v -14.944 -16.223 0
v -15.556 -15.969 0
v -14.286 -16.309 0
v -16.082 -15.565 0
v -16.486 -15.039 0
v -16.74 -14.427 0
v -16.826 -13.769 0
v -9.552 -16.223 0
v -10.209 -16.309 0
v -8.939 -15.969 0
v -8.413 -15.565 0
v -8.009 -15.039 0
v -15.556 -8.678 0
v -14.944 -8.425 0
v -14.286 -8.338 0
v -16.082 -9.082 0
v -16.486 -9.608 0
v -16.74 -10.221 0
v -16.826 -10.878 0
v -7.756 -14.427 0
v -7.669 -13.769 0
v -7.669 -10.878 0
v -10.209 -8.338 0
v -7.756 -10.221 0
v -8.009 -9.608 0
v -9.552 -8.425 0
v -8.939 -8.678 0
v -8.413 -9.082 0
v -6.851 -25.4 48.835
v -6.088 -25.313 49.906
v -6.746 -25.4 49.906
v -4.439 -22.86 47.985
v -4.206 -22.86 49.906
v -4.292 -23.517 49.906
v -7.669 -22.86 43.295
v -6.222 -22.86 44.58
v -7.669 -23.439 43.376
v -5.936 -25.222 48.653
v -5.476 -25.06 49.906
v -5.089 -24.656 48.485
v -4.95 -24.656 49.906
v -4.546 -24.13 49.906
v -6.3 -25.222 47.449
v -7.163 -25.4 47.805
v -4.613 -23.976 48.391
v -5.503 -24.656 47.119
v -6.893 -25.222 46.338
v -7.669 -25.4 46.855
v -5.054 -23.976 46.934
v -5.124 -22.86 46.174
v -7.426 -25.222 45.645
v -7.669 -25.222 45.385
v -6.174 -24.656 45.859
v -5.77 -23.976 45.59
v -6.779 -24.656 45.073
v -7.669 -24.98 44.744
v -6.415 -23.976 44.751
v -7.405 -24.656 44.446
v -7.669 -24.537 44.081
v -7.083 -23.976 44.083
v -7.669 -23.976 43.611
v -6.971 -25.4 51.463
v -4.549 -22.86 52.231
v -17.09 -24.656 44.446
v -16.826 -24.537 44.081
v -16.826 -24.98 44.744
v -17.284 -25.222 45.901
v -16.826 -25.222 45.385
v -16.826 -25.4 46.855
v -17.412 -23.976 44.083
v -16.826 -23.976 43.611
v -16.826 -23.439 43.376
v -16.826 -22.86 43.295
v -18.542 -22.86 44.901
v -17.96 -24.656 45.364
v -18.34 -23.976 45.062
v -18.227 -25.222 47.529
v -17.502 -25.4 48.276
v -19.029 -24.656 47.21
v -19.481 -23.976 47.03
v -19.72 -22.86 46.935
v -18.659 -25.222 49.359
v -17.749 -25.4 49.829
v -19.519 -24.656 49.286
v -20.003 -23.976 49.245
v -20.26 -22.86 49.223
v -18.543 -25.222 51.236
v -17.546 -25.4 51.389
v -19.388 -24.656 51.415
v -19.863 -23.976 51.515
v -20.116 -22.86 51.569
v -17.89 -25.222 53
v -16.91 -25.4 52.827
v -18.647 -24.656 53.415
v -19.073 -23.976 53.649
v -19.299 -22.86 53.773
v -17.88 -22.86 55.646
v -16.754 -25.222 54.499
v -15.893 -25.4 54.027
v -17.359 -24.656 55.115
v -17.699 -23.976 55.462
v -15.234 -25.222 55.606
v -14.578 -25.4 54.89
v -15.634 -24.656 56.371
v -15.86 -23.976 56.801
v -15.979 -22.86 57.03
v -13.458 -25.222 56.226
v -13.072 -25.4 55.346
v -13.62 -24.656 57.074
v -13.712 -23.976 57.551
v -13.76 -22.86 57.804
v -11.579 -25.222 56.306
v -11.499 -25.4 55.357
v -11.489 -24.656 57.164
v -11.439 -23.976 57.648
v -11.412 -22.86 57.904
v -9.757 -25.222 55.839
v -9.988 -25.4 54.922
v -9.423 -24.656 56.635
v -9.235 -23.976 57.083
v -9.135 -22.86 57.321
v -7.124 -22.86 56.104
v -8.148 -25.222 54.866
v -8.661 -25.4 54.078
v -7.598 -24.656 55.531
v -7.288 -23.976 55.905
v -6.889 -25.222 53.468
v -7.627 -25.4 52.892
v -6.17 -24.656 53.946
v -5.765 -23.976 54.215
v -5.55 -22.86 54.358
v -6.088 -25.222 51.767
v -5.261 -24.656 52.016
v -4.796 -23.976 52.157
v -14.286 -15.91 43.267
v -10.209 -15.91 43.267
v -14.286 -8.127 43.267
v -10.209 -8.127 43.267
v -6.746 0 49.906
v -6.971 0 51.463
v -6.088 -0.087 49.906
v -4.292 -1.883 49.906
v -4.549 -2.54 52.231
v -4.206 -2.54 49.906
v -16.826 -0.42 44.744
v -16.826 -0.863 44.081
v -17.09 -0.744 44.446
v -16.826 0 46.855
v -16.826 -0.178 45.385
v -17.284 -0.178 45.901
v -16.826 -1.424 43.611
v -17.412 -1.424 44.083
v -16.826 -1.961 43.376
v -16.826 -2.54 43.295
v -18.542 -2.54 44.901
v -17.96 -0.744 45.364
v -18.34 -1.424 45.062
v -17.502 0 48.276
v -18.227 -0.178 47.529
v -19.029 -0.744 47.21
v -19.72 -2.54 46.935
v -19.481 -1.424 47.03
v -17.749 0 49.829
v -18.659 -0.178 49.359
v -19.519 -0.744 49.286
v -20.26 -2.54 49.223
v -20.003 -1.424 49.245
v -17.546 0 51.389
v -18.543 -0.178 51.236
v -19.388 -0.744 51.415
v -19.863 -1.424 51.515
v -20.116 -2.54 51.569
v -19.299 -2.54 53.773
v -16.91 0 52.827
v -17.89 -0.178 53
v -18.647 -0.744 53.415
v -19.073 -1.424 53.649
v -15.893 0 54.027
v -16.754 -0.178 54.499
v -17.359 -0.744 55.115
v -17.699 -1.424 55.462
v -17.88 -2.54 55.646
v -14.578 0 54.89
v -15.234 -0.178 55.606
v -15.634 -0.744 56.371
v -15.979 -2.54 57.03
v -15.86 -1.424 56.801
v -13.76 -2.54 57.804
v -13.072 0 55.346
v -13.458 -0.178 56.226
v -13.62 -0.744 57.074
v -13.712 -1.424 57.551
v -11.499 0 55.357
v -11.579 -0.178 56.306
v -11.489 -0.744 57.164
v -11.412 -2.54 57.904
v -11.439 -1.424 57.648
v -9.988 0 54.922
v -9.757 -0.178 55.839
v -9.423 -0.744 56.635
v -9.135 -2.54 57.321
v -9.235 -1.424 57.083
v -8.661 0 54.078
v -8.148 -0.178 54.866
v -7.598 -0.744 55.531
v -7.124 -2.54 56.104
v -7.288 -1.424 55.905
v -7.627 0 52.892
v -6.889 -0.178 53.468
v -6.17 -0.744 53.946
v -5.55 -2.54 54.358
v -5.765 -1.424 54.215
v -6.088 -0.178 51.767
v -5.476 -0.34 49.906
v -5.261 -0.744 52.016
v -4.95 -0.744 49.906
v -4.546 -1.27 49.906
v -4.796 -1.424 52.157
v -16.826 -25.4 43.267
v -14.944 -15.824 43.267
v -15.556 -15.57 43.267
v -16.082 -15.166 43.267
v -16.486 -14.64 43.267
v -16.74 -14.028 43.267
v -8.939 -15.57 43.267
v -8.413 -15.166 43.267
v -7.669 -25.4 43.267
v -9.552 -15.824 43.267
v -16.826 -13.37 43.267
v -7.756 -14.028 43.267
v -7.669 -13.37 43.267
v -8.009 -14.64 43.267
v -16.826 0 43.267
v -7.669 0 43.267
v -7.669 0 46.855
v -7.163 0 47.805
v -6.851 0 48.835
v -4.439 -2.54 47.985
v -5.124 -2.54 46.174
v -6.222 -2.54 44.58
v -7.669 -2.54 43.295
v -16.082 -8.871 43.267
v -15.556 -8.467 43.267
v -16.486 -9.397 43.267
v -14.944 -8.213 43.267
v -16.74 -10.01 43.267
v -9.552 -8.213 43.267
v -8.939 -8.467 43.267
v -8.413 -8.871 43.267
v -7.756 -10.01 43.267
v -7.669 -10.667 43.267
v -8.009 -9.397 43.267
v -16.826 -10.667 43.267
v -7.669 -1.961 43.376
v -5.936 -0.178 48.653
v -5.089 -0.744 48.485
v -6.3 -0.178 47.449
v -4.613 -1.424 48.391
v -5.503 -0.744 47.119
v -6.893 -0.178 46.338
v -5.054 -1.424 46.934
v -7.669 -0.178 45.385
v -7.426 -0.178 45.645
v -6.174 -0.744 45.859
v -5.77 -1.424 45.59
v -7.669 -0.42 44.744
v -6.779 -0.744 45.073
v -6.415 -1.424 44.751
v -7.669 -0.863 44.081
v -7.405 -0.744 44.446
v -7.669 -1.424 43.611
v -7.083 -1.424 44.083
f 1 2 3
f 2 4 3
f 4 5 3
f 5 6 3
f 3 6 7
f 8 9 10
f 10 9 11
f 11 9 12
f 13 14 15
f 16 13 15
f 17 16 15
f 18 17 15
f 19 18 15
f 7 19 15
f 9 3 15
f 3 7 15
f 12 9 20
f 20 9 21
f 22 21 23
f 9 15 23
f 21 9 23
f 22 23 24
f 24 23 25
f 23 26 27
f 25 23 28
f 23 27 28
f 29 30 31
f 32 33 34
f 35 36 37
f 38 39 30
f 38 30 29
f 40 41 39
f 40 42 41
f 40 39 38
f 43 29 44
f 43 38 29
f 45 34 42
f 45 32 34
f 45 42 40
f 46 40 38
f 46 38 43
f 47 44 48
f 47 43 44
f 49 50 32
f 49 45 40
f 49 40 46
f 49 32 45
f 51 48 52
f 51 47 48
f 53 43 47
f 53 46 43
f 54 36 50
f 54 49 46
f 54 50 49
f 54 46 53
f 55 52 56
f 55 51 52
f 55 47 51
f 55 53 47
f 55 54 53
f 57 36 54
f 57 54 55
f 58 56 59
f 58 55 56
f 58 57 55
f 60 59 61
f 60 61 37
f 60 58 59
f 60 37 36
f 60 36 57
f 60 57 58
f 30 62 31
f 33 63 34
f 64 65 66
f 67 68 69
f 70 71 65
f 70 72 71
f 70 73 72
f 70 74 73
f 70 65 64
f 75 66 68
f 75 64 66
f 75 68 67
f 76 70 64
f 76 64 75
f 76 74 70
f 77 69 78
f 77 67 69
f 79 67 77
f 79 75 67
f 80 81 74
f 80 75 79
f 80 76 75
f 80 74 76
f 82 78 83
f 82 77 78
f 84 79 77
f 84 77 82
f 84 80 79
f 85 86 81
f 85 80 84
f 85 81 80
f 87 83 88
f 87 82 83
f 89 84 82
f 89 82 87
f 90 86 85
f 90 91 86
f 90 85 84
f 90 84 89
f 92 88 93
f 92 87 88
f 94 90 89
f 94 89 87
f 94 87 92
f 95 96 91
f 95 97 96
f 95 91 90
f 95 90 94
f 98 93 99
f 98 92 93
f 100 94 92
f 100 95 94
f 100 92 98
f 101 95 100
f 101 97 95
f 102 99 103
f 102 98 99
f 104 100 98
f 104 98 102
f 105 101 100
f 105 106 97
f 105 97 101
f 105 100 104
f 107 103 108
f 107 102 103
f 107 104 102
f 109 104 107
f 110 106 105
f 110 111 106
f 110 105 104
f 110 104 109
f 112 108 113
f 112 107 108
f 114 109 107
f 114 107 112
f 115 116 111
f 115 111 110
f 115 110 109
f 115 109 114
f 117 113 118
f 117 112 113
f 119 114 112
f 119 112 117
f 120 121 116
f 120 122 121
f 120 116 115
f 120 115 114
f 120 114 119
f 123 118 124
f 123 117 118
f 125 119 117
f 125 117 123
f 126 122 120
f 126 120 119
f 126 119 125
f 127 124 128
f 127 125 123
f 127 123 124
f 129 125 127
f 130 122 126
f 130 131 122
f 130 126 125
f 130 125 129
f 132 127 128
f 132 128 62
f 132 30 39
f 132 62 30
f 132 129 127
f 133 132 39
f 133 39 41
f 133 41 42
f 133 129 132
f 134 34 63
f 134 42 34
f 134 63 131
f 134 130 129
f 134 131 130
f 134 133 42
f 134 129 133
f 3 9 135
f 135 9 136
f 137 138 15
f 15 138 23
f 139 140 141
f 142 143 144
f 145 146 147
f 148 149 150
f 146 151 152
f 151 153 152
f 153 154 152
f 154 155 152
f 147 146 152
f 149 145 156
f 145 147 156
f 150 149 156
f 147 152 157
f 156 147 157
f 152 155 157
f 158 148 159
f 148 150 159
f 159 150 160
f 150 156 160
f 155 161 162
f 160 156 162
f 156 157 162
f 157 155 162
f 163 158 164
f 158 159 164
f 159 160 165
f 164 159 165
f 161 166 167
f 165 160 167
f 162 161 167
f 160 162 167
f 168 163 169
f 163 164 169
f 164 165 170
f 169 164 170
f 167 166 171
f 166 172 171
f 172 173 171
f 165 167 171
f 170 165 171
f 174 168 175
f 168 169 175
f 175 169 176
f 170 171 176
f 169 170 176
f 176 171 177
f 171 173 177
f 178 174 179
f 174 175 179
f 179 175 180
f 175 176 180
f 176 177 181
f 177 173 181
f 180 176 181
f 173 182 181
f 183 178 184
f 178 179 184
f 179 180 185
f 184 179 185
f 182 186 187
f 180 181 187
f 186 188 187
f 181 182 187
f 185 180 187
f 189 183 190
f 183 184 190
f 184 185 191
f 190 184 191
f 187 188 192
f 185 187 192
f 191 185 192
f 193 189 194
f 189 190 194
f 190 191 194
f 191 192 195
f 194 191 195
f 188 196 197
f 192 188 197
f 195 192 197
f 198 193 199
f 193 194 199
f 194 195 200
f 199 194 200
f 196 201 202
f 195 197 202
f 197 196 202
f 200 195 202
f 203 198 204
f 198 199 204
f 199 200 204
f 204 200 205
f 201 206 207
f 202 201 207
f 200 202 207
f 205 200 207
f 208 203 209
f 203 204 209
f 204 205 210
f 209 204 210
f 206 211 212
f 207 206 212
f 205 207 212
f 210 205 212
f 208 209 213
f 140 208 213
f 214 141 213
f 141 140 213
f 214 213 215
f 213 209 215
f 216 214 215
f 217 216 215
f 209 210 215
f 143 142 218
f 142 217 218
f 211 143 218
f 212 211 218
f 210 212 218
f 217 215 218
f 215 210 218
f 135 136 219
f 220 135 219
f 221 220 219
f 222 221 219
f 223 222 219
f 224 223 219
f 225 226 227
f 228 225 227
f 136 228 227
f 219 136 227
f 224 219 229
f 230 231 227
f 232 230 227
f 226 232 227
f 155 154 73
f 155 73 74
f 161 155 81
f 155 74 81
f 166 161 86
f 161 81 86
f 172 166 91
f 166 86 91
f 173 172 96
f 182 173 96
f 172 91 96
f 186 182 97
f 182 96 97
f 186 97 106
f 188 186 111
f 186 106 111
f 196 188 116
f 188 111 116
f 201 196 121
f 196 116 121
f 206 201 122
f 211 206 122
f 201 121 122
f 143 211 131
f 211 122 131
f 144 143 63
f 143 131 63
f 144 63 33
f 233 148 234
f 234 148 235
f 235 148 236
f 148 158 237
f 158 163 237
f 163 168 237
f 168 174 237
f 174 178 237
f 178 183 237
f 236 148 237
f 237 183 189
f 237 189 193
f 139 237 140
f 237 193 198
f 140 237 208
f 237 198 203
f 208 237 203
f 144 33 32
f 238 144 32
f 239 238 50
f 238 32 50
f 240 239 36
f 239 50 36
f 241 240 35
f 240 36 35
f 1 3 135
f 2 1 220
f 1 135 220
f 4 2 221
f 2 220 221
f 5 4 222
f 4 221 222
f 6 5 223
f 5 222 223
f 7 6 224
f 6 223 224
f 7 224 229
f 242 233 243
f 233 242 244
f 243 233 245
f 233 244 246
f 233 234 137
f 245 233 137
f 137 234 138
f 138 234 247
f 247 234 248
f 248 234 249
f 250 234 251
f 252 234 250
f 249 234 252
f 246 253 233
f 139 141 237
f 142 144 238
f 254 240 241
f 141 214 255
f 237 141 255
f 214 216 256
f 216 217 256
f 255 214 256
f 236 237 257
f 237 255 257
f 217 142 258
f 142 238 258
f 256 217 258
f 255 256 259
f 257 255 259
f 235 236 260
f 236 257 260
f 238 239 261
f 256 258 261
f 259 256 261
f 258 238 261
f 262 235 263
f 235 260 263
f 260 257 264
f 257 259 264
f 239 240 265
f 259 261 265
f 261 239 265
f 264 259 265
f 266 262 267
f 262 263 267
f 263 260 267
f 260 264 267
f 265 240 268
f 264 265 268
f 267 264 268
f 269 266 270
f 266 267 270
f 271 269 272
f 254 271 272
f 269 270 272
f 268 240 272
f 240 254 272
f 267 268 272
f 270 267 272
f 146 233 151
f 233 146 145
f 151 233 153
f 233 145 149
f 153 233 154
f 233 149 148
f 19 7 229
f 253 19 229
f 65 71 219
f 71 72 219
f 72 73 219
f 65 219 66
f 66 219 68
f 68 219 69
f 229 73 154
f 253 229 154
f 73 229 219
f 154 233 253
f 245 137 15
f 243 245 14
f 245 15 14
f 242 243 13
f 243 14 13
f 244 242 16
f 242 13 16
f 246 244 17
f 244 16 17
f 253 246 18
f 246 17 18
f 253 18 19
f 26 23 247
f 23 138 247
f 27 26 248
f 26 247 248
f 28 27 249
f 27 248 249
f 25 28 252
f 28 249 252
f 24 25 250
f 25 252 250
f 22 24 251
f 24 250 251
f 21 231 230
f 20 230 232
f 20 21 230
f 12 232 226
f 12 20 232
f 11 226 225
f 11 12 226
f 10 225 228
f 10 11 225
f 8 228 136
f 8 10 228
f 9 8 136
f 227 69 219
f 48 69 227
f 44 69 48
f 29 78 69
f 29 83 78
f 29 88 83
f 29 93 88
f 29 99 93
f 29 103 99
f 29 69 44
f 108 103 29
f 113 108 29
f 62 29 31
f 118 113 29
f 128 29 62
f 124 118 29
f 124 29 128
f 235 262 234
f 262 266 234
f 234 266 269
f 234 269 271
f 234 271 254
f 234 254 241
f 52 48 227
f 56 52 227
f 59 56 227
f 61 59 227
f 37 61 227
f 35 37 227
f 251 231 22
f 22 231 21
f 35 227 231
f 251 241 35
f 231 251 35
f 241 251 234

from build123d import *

# Parameters (mm, degrees)
F0_W     = 25.4
F0_H     = 63.5
F1_DEPTH = 25.4
F3_DEPTH = 25.4
F5_DEPTH = 25.4
F7_DEPTH = 25.4
F8_R     = 2.54


with BuildPart() as f1:
    # F0 (on Front) → F1 (new body)
    with BuildSketch(Plane.XZ):
        with Locations((-12.7, 31.75)):
            Rectangle(F0_W, F0_H)
    extrude(amount=F1_DEPTH)

    # F2 (on face) → F3 (cut)
    with BuildSketch(Plane.XZ.offset(25.4)):
        with BuildLine():
            Line((-16.826138, 0), (-16.826138, 43.294895))
            ThreePointArc((-16.826138, 43.294895), (-15.979296, 57.029675), (-4.20577, 49.906094))
            ThreePointArc((-4.20577, 49.906094), (-5.124016, 46.174395), (-7.669056, 43.294895))
            Line((-7.669056, 43.294895), (-7.669056, 0))
            Line((-7.669056, 0), (0, 0))
            Line((0, 0), (0, 63.5))
            Line((0, 63.5), (-25.4, 63.5))
            Line((-25.4, 63.5), (-25.4, 0))
            Line((-25.4, 0), (-16.826138, 0))
        make_face()
    extrude(amount=-F3_DEPTH, mode=Mode.SUBTRACT)

    # F4 (on Right) → F5 (cut)
    with BuildSketch(Plane.YZ):
        Polygon((5.837639, 43.267213), (-8.126909, 43.267213), (-8.355836, -3.662833), (5.837639, -3.662833), align=None)
    extrude(amount=-F5_DEPTH, mode=Mode.SUBTRACT)

    # F6 (on Right) → F7 (cut)
    with BuildSketch(Plane.YZ):
        Polygon((-16.368283, -6.409957), (-15.91043, 43.267213), (-32.622103, 43.267213), (-32.622103, -6.409957), align=None)
    extrude(amount=-F7_DEPTH, mode=Mode.SUBTRACT)

    # F8
    f8_edges = [f1.edges().sort_by_distance(p)[0] for p in [
        (-16.826138, -8.232439, 21.633606),
        (-16.826138, -16.109818, 21.633606),
        (-7.669056, -16.109818, 21.633606),
        (-7.669056, -8.232439, 21.633606),
        (-15.979296, -25.4, 57.029675),
        (-15.979296, 0, 57.029675),
    ]]
    fillet(f8_edges, radius=F8_R)


solid = f1.part
